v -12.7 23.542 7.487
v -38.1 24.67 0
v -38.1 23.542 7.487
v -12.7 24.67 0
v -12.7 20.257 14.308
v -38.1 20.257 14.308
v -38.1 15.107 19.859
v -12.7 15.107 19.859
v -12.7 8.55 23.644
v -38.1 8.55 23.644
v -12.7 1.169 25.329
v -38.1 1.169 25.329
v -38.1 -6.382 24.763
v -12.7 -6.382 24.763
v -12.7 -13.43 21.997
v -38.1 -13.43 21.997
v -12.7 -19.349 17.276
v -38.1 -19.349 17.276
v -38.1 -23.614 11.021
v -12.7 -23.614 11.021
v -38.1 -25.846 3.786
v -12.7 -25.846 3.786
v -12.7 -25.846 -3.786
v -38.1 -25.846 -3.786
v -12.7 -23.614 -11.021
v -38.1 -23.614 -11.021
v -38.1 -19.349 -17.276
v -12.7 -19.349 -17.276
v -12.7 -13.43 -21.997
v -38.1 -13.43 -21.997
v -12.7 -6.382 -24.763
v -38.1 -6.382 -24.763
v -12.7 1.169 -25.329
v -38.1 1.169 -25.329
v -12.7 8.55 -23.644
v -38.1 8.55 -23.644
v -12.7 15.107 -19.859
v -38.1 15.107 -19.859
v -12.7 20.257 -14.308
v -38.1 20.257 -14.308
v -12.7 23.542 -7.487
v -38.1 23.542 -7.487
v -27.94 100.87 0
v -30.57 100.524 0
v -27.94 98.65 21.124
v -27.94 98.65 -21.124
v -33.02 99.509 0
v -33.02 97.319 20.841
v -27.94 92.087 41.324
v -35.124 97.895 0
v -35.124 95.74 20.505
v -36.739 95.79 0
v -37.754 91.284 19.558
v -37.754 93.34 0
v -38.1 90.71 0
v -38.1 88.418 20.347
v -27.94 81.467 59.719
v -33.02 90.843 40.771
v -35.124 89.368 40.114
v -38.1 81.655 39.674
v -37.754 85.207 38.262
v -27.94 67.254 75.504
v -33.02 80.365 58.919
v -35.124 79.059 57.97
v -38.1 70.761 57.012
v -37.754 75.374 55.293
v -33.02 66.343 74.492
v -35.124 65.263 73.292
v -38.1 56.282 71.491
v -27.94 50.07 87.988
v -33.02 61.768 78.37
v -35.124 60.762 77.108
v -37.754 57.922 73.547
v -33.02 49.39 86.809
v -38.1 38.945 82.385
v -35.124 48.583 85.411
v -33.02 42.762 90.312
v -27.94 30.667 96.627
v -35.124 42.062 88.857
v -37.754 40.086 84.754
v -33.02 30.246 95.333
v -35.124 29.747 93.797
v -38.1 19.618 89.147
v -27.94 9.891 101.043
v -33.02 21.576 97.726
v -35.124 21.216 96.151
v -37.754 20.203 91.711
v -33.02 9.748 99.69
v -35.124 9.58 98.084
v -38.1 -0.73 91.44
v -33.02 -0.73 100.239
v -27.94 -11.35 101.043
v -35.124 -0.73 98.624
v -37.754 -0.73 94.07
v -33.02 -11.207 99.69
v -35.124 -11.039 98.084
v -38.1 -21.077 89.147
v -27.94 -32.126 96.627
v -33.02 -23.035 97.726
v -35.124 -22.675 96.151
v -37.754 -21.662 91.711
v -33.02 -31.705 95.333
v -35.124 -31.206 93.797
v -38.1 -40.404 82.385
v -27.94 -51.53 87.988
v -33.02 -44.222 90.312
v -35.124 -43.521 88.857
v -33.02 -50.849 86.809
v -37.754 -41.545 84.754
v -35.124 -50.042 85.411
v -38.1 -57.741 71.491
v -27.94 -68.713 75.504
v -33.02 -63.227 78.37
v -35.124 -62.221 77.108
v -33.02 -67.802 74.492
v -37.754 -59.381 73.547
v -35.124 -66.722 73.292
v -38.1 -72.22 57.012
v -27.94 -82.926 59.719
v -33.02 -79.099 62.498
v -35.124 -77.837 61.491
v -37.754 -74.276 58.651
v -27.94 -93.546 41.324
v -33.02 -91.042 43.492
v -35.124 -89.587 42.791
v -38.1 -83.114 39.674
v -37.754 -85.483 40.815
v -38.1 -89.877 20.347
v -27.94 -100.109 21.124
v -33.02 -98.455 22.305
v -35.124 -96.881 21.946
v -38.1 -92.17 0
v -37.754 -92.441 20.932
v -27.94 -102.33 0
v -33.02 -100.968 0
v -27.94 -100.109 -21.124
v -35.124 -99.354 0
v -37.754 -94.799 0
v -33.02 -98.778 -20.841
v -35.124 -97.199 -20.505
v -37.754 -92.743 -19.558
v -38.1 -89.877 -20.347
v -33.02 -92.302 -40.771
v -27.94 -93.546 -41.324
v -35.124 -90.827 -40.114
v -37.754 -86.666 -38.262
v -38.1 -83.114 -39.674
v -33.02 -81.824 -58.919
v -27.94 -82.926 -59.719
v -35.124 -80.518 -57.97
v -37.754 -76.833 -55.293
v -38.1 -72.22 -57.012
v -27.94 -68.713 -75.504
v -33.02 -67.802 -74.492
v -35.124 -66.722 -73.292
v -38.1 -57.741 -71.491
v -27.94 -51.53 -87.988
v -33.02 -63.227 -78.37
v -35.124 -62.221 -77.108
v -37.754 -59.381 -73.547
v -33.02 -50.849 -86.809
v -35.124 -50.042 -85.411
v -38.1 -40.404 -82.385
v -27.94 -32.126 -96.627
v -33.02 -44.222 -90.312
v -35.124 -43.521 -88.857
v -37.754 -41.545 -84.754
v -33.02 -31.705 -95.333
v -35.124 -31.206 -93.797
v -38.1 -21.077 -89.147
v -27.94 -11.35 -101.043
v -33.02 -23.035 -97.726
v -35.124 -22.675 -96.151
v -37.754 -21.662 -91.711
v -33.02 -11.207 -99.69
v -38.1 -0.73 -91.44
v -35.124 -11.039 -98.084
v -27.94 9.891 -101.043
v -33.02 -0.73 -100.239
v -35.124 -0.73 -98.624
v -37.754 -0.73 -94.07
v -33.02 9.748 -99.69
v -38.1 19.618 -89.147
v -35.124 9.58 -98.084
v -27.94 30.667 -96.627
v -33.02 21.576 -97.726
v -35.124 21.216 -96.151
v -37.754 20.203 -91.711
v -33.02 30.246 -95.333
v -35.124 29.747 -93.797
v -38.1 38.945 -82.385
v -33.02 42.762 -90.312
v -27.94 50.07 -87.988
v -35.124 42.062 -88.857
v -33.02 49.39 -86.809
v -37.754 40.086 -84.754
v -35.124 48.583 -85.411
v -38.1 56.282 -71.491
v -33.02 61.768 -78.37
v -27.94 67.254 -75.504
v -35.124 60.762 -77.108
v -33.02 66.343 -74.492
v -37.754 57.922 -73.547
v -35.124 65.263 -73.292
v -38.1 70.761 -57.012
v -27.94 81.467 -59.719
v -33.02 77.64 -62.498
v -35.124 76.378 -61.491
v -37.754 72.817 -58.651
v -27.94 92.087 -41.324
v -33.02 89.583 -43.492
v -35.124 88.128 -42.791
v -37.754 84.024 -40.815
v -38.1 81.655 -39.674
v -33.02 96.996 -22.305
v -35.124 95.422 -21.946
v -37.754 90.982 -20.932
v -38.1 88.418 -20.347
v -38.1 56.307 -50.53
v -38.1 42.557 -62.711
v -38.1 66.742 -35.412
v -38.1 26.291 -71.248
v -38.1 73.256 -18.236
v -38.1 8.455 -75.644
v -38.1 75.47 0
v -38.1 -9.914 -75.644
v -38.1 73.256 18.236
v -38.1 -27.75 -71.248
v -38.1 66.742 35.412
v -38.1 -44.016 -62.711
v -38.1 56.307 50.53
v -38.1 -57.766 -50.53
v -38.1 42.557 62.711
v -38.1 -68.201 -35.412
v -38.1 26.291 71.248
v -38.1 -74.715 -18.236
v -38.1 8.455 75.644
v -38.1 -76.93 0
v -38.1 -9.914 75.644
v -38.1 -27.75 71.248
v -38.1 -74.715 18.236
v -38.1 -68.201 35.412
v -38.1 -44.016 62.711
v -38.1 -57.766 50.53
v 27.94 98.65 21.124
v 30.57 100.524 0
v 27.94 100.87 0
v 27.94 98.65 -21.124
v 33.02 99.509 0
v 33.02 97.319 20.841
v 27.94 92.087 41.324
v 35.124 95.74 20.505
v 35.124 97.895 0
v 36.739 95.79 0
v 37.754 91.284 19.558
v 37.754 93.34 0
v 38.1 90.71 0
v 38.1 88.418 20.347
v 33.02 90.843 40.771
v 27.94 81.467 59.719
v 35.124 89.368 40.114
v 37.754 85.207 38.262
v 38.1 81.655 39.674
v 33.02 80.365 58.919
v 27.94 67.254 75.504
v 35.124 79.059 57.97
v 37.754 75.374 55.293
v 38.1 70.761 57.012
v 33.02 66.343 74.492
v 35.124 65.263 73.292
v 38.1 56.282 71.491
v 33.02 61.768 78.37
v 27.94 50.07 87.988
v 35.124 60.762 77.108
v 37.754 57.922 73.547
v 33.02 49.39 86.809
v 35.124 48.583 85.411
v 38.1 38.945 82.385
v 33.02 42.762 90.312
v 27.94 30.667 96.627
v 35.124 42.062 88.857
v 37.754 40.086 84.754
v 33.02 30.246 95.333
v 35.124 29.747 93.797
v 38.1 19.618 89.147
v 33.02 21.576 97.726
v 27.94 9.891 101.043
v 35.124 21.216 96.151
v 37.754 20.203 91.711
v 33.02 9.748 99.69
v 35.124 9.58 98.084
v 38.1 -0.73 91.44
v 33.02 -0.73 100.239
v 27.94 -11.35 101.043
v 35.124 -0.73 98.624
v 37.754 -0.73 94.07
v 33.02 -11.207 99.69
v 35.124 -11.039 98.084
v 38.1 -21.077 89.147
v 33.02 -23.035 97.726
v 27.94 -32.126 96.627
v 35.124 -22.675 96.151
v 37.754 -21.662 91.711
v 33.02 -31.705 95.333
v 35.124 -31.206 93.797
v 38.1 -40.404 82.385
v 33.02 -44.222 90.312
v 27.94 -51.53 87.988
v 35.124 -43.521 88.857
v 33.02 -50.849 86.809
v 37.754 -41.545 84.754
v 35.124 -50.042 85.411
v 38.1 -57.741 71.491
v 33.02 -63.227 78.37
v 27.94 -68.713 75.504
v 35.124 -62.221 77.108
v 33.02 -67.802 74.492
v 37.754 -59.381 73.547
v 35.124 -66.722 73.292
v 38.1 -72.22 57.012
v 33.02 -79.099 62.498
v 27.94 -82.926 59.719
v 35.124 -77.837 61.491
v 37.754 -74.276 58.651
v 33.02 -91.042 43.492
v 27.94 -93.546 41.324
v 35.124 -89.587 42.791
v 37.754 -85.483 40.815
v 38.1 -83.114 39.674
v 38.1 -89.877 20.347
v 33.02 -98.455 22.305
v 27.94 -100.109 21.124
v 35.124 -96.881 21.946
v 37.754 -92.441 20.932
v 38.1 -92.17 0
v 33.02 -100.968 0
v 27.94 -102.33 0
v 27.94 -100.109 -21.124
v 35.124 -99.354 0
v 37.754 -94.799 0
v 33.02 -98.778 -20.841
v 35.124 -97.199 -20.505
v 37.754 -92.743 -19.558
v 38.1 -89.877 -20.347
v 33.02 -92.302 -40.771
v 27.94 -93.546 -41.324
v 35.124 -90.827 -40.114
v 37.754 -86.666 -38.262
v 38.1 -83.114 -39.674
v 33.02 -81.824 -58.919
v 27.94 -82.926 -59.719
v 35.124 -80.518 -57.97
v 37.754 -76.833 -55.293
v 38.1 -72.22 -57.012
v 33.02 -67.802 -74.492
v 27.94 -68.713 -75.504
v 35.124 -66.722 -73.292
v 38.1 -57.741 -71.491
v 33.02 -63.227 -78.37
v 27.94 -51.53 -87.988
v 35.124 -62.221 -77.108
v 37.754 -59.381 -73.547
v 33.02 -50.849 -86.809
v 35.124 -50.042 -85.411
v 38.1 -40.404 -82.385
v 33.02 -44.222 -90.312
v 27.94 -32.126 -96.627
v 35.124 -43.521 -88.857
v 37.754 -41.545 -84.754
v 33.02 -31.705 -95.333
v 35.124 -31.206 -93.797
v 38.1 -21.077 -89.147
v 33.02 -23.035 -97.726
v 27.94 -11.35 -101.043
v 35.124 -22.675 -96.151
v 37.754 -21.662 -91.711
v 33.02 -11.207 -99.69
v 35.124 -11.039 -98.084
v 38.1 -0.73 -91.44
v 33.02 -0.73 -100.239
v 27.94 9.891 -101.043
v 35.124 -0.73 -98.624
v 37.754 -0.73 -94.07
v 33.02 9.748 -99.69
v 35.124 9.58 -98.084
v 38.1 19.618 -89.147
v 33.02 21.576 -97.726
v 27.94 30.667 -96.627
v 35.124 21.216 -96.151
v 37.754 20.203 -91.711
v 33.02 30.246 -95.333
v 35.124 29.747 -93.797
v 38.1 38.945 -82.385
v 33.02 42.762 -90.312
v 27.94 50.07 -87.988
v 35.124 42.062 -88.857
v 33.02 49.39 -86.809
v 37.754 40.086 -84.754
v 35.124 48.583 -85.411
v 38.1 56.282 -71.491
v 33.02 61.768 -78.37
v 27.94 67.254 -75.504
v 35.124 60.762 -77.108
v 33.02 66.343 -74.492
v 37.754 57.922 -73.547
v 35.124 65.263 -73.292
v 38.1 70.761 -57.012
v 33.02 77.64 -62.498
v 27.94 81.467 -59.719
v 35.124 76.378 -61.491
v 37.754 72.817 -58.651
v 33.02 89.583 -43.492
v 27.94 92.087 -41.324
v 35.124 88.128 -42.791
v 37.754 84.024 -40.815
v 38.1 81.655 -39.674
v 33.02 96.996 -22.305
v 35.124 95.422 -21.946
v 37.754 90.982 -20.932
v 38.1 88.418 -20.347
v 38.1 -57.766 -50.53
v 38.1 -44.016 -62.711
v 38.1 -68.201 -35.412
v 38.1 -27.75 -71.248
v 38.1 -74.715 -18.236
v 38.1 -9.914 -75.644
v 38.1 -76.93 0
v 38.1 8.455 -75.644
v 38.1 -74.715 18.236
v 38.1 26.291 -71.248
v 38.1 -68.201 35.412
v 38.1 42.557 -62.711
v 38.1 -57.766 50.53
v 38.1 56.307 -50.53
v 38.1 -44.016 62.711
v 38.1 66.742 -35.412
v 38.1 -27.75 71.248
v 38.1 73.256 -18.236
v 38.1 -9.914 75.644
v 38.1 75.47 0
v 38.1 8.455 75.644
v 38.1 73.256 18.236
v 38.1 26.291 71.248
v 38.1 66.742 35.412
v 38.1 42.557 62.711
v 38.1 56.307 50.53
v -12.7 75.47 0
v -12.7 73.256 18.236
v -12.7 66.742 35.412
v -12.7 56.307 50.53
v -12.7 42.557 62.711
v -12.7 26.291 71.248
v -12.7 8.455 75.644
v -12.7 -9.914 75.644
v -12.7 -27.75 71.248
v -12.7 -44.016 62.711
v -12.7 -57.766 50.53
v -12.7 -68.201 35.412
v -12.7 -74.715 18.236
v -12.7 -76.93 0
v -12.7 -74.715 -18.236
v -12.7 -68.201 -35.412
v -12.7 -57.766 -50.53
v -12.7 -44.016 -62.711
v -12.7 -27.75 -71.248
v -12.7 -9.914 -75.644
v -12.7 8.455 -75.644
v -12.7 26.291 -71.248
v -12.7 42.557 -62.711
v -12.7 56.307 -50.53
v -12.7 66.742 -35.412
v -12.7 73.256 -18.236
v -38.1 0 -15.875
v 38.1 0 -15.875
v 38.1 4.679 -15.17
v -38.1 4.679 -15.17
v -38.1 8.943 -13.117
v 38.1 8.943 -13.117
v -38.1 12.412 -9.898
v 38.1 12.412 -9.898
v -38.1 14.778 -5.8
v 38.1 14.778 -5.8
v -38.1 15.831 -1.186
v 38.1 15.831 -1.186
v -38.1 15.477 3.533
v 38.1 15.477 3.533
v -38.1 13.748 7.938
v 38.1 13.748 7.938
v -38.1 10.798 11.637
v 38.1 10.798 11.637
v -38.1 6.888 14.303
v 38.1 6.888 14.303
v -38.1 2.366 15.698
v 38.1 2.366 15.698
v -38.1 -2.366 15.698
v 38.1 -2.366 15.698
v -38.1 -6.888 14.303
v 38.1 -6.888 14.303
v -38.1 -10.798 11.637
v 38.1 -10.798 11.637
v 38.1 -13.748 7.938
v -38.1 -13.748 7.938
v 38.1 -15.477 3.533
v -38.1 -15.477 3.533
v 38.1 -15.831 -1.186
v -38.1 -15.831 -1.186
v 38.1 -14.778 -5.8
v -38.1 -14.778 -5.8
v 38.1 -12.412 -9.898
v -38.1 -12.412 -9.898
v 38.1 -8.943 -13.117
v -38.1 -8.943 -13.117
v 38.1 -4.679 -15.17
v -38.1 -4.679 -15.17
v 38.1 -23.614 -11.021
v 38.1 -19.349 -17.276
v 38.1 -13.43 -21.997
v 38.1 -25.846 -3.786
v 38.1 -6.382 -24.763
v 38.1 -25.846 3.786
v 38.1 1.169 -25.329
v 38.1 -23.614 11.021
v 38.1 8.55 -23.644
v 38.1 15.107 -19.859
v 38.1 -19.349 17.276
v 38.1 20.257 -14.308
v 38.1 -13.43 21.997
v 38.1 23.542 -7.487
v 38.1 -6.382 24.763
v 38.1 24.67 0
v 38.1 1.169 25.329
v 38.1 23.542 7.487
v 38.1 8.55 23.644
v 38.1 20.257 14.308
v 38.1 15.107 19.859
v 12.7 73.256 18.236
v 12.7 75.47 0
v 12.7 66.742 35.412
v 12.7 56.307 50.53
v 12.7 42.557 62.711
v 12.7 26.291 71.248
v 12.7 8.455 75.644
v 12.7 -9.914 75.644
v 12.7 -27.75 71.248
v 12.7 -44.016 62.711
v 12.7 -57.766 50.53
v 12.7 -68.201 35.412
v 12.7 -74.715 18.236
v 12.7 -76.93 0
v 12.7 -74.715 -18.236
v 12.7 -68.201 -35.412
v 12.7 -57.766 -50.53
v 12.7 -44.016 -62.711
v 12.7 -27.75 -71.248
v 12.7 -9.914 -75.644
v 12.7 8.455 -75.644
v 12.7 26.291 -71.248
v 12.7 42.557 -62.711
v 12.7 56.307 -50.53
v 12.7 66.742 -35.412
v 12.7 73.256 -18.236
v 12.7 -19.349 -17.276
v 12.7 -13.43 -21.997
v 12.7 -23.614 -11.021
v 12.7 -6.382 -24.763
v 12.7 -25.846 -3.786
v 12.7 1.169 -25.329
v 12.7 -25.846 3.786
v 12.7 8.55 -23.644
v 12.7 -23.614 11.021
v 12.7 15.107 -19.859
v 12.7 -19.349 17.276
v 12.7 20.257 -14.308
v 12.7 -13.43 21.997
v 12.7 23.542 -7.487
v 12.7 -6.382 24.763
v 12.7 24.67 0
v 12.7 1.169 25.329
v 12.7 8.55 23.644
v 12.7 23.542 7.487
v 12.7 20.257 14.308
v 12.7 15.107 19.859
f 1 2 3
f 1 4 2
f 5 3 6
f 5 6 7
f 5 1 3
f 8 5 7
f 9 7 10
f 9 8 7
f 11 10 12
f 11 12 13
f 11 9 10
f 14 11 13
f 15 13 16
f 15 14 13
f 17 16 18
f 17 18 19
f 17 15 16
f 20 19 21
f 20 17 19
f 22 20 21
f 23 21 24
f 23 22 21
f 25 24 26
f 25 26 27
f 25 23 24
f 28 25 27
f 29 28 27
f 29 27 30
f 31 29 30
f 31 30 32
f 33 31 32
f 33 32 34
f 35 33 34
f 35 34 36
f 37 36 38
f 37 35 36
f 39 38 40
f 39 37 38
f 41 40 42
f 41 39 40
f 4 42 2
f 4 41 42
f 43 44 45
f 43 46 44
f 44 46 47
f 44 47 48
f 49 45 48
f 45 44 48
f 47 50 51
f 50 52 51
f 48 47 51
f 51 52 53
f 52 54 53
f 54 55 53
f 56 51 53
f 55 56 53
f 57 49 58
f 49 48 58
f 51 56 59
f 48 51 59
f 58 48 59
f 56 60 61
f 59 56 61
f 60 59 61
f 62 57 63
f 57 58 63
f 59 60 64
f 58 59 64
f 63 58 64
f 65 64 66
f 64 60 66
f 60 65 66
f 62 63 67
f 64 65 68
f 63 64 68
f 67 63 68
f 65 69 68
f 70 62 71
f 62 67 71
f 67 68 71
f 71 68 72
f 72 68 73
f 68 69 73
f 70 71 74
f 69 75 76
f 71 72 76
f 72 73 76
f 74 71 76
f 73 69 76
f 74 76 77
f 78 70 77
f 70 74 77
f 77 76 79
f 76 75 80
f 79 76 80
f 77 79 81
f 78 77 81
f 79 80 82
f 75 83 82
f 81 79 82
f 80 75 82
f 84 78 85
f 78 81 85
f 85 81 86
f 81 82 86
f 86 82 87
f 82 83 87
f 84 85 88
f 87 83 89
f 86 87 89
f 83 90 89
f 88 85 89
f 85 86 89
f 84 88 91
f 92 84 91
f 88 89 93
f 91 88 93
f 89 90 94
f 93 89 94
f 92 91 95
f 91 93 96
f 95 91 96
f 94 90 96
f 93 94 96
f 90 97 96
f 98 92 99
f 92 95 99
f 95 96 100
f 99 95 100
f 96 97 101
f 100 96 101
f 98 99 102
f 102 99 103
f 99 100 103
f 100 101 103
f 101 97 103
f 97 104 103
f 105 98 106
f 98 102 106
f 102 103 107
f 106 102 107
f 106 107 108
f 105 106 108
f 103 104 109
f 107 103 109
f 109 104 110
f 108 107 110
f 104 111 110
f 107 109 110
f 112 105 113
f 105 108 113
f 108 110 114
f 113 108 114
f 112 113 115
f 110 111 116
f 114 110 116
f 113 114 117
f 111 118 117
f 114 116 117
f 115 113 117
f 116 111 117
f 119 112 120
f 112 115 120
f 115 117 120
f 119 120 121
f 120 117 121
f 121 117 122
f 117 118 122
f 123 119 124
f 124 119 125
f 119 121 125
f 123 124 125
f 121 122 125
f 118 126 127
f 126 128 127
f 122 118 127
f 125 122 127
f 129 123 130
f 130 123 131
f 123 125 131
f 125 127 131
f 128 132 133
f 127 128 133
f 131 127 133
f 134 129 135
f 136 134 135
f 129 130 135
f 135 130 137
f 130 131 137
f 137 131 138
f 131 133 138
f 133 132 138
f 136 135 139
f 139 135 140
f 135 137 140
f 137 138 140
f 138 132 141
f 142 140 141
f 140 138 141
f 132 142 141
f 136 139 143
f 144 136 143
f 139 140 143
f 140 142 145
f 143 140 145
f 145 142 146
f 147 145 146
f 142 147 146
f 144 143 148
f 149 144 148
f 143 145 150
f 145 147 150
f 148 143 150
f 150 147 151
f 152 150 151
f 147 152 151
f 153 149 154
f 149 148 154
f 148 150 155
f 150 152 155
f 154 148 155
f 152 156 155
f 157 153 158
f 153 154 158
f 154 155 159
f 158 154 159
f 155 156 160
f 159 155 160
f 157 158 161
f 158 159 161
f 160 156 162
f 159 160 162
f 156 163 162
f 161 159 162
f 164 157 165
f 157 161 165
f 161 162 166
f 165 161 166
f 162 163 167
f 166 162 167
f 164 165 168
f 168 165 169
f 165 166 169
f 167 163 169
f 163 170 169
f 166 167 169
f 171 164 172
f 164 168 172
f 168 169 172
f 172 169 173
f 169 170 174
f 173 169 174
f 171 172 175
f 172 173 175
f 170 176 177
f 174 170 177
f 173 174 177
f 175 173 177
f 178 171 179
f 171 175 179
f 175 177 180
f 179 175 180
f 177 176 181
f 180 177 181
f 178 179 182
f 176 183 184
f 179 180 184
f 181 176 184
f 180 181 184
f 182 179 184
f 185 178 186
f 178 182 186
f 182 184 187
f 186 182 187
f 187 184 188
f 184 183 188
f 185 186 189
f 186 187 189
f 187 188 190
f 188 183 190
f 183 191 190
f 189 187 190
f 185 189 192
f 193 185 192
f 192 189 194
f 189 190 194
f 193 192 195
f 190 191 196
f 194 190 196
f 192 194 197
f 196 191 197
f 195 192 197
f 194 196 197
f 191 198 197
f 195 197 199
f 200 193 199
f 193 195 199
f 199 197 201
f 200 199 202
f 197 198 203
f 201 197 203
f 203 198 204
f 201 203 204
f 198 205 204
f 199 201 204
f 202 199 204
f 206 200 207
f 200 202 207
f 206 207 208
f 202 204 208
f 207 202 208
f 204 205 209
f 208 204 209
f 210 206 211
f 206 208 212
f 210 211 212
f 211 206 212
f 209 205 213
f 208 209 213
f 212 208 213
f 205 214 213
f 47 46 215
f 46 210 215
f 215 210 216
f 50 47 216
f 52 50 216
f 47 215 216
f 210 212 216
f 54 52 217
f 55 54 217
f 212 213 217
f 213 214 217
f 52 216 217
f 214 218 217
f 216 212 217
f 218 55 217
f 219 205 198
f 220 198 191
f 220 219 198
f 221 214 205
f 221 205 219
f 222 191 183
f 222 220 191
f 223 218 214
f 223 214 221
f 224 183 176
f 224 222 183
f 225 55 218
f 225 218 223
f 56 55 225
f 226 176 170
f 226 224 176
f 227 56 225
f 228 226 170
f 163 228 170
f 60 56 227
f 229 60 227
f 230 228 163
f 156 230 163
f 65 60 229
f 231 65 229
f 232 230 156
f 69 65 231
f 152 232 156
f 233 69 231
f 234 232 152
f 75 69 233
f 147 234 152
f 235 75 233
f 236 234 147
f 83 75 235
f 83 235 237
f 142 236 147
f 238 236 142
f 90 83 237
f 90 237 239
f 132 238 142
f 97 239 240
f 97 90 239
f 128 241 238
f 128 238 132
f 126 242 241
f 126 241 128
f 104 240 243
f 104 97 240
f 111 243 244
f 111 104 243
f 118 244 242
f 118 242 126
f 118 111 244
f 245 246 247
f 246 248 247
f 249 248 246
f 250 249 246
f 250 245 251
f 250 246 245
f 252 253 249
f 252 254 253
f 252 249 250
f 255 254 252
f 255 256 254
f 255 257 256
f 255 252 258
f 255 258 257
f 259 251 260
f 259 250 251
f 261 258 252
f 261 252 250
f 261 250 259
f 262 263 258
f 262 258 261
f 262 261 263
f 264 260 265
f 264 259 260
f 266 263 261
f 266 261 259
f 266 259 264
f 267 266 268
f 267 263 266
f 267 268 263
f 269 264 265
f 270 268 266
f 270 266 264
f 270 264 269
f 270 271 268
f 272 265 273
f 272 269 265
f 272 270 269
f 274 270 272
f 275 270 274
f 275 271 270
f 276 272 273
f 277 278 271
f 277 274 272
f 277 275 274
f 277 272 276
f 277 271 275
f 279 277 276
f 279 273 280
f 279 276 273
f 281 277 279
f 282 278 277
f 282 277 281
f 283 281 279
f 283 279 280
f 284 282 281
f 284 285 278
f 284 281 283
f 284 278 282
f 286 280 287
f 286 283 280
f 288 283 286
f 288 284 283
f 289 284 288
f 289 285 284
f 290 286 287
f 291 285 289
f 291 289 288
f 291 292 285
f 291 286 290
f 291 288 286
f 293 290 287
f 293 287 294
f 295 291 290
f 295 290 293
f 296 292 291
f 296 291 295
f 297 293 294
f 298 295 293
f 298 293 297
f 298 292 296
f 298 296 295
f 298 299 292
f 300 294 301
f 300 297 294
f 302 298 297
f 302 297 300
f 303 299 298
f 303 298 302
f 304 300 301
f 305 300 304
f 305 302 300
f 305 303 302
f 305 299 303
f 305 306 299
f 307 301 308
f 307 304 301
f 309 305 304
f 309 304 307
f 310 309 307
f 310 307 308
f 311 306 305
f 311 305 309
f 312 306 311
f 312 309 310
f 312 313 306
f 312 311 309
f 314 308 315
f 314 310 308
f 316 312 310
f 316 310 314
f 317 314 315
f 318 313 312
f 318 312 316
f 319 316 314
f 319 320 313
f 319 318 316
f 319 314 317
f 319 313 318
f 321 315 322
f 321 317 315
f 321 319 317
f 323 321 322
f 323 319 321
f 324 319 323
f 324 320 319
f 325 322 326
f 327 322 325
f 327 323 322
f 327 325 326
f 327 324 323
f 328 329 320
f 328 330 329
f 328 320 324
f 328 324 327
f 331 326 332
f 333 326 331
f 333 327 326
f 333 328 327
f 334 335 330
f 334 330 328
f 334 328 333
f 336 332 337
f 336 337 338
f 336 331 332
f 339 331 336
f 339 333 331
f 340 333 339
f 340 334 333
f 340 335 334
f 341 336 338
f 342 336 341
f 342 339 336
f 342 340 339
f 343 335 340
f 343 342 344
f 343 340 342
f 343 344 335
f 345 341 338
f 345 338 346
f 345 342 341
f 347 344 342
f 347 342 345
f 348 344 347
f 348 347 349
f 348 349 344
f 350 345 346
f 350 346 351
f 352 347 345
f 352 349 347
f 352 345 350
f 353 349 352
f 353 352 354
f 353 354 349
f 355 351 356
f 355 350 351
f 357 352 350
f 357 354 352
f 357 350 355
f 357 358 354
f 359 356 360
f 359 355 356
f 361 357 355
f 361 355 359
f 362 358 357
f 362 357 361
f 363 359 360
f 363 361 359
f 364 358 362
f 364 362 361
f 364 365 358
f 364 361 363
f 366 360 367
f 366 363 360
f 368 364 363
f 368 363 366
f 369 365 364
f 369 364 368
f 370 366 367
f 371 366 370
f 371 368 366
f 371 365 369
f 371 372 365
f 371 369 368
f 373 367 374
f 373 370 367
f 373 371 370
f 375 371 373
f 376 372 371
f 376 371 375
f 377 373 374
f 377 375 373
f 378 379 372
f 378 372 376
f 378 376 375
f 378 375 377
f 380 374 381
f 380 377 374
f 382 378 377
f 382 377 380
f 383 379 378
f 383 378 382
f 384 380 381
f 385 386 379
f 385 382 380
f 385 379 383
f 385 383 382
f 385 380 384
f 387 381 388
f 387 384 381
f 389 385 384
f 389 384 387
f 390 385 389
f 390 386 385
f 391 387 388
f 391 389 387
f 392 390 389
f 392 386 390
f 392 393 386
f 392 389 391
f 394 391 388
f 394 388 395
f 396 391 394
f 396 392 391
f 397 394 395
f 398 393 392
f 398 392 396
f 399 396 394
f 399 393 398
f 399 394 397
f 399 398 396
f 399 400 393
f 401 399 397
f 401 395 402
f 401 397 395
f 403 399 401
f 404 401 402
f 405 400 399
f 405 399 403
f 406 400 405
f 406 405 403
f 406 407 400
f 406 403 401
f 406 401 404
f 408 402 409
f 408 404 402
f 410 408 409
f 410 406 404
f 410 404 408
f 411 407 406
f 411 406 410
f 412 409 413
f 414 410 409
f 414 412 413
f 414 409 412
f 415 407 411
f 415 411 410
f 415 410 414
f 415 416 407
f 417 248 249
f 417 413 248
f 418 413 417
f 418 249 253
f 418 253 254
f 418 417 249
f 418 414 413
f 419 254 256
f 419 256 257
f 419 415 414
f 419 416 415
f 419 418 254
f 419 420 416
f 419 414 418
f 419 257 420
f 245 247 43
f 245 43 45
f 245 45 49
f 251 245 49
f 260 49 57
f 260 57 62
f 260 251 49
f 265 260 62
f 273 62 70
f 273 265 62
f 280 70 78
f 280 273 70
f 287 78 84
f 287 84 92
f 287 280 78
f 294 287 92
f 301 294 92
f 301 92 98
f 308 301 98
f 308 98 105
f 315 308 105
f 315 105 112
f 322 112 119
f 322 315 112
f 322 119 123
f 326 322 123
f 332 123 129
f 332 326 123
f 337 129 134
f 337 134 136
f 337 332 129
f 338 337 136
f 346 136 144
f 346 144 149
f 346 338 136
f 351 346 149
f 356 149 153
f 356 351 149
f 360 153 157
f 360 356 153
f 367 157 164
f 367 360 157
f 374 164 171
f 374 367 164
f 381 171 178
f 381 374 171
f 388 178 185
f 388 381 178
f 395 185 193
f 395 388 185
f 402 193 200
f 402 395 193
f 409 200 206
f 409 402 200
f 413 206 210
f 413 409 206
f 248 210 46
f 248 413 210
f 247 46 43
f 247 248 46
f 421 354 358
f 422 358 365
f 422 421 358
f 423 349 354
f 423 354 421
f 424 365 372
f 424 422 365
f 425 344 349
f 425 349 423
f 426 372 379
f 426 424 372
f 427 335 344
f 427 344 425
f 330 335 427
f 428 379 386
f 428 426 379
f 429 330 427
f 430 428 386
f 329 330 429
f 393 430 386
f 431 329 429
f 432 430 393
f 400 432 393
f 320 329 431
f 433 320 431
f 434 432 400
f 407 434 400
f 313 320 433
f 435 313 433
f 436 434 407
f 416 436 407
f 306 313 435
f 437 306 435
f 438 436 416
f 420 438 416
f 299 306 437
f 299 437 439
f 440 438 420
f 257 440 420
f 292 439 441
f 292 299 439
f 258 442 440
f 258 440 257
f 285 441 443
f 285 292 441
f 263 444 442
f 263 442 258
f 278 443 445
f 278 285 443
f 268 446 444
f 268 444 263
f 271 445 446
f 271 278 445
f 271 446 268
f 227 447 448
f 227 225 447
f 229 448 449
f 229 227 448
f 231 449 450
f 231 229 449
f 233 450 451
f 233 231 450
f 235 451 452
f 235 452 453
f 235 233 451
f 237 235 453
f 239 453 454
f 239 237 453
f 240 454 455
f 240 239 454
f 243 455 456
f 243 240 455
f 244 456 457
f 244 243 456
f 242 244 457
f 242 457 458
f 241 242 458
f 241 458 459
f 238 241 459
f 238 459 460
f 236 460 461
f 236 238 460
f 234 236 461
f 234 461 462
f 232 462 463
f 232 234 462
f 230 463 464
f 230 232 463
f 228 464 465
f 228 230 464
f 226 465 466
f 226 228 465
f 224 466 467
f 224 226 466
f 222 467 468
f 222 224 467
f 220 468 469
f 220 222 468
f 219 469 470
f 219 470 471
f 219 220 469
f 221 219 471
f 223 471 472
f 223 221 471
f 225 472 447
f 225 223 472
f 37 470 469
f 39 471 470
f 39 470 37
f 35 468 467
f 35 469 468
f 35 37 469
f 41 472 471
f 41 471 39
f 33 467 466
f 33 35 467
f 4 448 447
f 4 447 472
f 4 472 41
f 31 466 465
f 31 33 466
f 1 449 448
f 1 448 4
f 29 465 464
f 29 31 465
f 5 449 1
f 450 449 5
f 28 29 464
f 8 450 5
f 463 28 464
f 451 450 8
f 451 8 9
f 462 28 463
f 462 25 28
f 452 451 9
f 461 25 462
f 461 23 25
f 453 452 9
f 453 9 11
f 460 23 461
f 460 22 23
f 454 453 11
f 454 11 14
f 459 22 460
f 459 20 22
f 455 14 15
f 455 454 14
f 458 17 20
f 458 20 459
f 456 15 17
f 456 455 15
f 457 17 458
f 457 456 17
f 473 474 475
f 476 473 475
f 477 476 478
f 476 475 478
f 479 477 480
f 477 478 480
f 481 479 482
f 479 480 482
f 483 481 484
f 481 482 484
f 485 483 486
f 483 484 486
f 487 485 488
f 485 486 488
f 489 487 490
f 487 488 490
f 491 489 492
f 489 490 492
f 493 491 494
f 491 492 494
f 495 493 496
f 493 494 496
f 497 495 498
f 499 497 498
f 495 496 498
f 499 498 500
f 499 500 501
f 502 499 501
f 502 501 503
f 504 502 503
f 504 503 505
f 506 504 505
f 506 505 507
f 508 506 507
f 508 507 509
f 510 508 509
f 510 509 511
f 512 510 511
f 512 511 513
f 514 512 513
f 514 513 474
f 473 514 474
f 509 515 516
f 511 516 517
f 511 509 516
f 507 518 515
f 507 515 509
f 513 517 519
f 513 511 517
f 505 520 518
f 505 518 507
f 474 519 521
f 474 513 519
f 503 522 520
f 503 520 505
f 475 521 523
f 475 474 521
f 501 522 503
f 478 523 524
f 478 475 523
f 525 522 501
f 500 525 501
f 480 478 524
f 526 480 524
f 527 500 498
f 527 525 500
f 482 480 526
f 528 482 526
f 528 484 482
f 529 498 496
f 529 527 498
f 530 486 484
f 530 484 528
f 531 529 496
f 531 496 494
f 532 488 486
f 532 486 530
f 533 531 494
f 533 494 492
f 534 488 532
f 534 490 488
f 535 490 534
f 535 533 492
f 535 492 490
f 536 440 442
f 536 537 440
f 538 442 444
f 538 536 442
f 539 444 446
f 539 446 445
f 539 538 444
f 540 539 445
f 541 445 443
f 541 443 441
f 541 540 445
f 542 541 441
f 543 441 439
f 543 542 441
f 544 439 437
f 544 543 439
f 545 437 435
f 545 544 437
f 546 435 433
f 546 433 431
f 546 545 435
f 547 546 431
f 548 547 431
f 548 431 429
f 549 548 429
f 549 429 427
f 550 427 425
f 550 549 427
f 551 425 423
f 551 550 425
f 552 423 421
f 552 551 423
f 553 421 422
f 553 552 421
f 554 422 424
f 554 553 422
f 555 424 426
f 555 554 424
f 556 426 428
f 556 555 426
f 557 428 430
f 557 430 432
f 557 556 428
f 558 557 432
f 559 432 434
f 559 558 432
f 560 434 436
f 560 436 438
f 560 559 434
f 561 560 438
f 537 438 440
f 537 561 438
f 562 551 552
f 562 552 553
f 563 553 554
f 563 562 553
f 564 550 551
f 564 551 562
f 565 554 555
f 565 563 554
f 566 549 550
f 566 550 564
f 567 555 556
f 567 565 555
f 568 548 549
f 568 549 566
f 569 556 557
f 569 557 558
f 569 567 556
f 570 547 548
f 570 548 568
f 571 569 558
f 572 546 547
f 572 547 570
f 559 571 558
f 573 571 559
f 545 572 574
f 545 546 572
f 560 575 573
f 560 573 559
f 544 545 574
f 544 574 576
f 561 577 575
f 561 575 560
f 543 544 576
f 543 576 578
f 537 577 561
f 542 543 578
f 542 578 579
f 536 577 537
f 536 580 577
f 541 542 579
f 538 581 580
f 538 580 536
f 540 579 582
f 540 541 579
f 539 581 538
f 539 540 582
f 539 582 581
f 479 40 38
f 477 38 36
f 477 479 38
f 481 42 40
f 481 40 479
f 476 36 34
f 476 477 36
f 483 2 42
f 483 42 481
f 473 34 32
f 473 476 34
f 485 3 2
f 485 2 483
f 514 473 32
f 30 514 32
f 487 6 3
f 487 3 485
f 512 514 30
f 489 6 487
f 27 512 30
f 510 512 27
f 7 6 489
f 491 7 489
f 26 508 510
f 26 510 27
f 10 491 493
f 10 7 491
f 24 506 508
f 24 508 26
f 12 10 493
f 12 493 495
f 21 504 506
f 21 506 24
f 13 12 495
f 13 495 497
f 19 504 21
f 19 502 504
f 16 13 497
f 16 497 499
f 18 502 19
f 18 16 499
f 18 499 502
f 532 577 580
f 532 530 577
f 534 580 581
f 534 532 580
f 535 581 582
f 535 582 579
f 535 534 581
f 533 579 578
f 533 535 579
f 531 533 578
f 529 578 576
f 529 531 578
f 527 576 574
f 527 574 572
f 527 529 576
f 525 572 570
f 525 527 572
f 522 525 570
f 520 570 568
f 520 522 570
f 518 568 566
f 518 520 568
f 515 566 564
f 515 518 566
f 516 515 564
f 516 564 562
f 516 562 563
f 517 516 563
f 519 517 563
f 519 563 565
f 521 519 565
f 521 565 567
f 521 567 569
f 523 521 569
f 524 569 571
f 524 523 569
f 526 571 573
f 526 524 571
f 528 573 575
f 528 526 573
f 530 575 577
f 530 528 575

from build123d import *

# Parameters (mm, degrees)
SKETCH2_R          = 15.875
CUT_EXTRUDE1_DEPTH = 77.2
FILLET2_R          = 10.16
FILLET3_R          = 10.16


with BuildPart() as part:
    # Sketch1 → Revolve2 (revolve)
    with BuildSketch(Plane.XY):
        Polygon((-38.1, -0.729526652), (-38.1, 24.670473348), (-12.7, 24.670473348), (-12.7, 75.470473348), (-38.1, 75.470473348), (-38.1, 100.870473348), (38.1, 100.870473348), (38.1, 75.470473348), (12.7, 75.470473348), (12.7, 24.670473348), (38.1, 24.670473348), (38.1, -0.729526652), align=None)
    revolve(axis=Axis((-38.1, -0.729526652, 0), (1, 0, 0)))

    # Sketch2 → Cut-Extrude1 (cut, through all)
    with BuildSketch(Plane(origin=(38.1, 0, 0), x_dir=(0, 0, -1), z_dir=(1, 0, 0))):
        Circle(SKETCH2_R)
    extrude(amount=-CUT_EXTRUDE1_DEPTH, mode=Mode.SUBTRACT)

    # Fillet2
    fillet2_edges = [part.edges().sort_by_distance(p)[0] for p in [
        (38.1, -102.329526652, 0),
    ]]
    fillet(fillet2_edges, radius=FILLET2_R)

    # Fillet3
    fillet3_edges = [part.edges().sort_by_distance(p)[0] for p in [
        (-38.1, -102.329526652, 0),
    ]]
    fillet(fillet3_edges, radius=FILLET3_R)


solid = part.part
